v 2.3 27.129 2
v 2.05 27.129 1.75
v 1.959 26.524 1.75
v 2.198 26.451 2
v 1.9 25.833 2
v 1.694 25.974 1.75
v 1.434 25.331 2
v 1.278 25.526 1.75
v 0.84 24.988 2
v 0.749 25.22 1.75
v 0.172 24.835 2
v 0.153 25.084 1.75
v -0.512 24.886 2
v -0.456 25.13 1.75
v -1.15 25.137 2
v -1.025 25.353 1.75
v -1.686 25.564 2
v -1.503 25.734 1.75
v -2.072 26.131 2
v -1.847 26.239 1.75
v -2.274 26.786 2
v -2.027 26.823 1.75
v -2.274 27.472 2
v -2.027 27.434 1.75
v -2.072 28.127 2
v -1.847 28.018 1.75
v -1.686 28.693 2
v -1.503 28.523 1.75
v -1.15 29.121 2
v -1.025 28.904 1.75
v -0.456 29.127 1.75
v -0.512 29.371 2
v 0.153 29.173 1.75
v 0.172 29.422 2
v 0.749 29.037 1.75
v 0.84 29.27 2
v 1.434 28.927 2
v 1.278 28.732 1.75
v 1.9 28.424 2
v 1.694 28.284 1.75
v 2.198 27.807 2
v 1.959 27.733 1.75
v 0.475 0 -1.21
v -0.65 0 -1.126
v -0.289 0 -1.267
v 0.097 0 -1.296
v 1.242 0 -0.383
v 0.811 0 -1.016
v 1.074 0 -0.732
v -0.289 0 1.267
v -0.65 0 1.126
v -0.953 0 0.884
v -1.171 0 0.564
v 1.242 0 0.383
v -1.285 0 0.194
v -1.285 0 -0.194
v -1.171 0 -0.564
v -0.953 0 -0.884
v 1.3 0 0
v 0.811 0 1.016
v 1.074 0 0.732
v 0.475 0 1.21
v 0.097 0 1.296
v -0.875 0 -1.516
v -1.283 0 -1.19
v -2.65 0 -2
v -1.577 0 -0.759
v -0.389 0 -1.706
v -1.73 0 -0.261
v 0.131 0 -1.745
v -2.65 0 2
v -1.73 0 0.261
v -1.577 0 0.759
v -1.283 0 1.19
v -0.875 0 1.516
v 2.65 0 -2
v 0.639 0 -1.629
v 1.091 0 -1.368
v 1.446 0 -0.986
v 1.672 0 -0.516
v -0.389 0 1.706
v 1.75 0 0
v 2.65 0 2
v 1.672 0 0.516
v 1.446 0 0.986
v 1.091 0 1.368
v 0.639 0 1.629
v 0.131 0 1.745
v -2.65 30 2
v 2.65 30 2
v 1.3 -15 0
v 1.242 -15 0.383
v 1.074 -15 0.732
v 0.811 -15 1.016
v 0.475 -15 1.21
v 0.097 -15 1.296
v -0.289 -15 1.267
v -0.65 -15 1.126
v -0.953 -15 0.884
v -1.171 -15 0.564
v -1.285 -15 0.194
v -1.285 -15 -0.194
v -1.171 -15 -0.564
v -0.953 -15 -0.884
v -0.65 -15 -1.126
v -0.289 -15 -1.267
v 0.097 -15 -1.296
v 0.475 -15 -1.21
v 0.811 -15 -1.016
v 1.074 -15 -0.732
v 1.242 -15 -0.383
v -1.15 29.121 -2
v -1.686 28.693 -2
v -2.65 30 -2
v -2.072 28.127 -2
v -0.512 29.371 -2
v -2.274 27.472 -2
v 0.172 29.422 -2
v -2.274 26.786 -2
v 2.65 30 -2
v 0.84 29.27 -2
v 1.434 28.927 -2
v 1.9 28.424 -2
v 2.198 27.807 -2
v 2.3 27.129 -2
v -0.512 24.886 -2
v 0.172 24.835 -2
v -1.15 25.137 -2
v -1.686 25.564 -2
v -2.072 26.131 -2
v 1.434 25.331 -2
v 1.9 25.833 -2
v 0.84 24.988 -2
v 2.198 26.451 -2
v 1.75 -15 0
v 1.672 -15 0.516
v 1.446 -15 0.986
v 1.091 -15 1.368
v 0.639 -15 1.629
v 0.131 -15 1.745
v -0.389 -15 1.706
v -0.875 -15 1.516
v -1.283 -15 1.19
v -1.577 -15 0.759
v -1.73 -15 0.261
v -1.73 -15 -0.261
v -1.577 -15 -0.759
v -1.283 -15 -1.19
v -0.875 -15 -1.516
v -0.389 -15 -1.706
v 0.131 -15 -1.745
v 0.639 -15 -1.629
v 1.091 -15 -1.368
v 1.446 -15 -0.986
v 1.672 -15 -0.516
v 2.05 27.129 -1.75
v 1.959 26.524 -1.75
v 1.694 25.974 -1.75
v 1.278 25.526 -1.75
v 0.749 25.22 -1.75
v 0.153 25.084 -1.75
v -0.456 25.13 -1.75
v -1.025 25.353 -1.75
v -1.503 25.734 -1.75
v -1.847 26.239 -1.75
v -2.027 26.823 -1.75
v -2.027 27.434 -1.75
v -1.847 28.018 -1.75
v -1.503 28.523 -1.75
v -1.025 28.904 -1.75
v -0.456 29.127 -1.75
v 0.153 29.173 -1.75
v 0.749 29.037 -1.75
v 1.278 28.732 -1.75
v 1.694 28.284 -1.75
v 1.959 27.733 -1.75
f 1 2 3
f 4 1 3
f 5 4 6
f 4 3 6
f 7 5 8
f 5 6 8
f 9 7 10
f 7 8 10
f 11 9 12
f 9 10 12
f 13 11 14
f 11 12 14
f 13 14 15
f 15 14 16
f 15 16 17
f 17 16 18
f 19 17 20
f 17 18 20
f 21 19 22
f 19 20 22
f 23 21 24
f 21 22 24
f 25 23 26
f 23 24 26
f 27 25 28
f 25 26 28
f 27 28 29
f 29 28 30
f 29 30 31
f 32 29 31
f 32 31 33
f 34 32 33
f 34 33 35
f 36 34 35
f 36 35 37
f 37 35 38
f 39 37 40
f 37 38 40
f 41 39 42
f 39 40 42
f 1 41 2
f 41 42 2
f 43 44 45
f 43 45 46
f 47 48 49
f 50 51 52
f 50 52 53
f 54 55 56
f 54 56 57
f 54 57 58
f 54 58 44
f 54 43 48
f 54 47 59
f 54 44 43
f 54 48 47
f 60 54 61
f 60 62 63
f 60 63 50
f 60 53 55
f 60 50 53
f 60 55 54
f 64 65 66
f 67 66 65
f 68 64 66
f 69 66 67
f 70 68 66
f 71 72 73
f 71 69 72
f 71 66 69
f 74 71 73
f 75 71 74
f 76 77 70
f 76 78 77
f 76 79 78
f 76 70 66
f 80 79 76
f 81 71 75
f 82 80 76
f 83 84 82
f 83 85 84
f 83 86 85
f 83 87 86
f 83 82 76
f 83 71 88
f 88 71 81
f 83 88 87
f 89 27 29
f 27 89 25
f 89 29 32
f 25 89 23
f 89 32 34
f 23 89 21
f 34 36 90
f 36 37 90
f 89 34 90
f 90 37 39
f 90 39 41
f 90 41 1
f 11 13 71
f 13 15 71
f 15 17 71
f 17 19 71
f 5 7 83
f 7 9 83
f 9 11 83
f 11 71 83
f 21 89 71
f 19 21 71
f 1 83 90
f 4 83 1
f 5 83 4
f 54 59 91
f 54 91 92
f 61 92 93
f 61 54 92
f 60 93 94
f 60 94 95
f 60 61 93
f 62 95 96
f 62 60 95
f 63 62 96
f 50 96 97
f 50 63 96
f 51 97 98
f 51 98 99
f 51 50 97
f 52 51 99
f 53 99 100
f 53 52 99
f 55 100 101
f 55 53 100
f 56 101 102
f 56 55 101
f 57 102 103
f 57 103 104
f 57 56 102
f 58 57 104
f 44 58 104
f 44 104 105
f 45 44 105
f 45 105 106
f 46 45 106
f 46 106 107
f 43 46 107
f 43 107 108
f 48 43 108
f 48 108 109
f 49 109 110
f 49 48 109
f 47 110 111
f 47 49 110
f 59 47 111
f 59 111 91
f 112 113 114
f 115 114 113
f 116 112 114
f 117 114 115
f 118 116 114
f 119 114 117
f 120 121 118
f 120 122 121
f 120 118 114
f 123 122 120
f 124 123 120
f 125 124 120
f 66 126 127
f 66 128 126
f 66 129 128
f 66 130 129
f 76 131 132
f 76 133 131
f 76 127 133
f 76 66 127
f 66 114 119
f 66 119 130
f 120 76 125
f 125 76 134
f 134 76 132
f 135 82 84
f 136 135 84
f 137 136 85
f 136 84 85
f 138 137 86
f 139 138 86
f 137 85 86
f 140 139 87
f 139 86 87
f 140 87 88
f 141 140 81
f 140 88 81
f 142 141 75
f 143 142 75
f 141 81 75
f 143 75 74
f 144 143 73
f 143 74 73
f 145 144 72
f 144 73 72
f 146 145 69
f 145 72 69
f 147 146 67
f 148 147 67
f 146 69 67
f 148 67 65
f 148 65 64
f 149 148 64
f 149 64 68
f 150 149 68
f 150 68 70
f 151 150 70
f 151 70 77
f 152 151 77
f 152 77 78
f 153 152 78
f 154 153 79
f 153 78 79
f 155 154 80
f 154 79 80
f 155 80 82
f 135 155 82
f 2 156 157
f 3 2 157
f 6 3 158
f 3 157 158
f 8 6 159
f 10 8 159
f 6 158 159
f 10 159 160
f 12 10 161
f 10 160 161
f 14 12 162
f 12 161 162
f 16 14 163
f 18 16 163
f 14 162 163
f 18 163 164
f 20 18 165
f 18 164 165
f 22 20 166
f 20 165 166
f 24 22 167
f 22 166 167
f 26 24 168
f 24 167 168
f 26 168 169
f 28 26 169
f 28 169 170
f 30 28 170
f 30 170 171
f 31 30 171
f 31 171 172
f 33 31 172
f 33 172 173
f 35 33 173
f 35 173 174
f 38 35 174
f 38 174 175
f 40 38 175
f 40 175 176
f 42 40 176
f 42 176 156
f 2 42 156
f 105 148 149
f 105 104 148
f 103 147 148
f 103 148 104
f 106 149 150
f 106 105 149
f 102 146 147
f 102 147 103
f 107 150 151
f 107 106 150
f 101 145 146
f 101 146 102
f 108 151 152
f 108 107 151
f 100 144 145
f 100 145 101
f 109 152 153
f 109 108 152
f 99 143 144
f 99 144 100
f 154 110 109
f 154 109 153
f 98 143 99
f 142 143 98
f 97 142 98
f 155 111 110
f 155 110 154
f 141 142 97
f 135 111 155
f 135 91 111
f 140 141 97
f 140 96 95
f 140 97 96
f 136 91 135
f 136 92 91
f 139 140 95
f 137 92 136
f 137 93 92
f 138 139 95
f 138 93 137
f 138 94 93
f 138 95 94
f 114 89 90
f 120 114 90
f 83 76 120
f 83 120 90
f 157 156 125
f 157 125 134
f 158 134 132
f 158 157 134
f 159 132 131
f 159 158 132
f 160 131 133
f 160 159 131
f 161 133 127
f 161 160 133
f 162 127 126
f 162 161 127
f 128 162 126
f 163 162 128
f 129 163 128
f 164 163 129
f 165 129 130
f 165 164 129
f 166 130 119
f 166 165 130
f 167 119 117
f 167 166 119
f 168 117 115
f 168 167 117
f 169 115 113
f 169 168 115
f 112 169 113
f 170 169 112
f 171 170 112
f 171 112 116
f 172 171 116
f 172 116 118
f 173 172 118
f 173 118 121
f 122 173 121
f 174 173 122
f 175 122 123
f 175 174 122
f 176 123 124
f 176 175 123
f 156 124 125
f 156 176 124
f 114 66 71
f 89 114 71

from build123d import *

# Parameters (mm, degrees)
F0_W     = 5.3
F0_H     = 4
F1_DEPTH = 30
F2_R     = 1.75
F2_R_2   = 1.3
F3_DEPTH = 15
F4_R     = 1.3
F5_DEPTH = 25.8
F6_R     = 2.05
F7_DEPTH = 5
F8_SIZE  = 0.25


with BuildPart() as f1:
    # F0 (on Front) → F1 (new body)
    with BuildSketch(Plane.XZ):
        Rectangle(F0_W, F0_H)
    extrude(amount=-F1_DEPTH)

    # F2 (on face) → F3 (join)
    with BuildSketch(Plane.XZ):
        Circle(F2_R)
        Circle(F2_R_2, mode=Mode.SUBTRACT)
    extrude(amount=F3_DEPTH)

    # F4 (on face) → F5 (join)
    with BuildSketch(Plane.XZ):
        Circle(F4_R)
    extrude(amount=-F5_DEPTH)

    # F6 (on face) → F7 (cut)
    with BuildSketch(Plane(origin=(0, 0, -2), x_dir=(1, 0, 0), z_dir=(0, 0, -1))):
        with Locations((0, -27.128747)):
            Circle(F6_R)
    extrude(amount=-F7_DEPTH, mode=Mode.SUBTRACT)

    # F8
    f8_edges = [f1.edges().sort_by_distance(p)[0] for p in [
        (-2.05, 27.128747, -2),
        (-2.05, 27.128747, 2),
    ]]
    chamfer(f8_edges, length=F8_SIZE)


solid = f1.part
